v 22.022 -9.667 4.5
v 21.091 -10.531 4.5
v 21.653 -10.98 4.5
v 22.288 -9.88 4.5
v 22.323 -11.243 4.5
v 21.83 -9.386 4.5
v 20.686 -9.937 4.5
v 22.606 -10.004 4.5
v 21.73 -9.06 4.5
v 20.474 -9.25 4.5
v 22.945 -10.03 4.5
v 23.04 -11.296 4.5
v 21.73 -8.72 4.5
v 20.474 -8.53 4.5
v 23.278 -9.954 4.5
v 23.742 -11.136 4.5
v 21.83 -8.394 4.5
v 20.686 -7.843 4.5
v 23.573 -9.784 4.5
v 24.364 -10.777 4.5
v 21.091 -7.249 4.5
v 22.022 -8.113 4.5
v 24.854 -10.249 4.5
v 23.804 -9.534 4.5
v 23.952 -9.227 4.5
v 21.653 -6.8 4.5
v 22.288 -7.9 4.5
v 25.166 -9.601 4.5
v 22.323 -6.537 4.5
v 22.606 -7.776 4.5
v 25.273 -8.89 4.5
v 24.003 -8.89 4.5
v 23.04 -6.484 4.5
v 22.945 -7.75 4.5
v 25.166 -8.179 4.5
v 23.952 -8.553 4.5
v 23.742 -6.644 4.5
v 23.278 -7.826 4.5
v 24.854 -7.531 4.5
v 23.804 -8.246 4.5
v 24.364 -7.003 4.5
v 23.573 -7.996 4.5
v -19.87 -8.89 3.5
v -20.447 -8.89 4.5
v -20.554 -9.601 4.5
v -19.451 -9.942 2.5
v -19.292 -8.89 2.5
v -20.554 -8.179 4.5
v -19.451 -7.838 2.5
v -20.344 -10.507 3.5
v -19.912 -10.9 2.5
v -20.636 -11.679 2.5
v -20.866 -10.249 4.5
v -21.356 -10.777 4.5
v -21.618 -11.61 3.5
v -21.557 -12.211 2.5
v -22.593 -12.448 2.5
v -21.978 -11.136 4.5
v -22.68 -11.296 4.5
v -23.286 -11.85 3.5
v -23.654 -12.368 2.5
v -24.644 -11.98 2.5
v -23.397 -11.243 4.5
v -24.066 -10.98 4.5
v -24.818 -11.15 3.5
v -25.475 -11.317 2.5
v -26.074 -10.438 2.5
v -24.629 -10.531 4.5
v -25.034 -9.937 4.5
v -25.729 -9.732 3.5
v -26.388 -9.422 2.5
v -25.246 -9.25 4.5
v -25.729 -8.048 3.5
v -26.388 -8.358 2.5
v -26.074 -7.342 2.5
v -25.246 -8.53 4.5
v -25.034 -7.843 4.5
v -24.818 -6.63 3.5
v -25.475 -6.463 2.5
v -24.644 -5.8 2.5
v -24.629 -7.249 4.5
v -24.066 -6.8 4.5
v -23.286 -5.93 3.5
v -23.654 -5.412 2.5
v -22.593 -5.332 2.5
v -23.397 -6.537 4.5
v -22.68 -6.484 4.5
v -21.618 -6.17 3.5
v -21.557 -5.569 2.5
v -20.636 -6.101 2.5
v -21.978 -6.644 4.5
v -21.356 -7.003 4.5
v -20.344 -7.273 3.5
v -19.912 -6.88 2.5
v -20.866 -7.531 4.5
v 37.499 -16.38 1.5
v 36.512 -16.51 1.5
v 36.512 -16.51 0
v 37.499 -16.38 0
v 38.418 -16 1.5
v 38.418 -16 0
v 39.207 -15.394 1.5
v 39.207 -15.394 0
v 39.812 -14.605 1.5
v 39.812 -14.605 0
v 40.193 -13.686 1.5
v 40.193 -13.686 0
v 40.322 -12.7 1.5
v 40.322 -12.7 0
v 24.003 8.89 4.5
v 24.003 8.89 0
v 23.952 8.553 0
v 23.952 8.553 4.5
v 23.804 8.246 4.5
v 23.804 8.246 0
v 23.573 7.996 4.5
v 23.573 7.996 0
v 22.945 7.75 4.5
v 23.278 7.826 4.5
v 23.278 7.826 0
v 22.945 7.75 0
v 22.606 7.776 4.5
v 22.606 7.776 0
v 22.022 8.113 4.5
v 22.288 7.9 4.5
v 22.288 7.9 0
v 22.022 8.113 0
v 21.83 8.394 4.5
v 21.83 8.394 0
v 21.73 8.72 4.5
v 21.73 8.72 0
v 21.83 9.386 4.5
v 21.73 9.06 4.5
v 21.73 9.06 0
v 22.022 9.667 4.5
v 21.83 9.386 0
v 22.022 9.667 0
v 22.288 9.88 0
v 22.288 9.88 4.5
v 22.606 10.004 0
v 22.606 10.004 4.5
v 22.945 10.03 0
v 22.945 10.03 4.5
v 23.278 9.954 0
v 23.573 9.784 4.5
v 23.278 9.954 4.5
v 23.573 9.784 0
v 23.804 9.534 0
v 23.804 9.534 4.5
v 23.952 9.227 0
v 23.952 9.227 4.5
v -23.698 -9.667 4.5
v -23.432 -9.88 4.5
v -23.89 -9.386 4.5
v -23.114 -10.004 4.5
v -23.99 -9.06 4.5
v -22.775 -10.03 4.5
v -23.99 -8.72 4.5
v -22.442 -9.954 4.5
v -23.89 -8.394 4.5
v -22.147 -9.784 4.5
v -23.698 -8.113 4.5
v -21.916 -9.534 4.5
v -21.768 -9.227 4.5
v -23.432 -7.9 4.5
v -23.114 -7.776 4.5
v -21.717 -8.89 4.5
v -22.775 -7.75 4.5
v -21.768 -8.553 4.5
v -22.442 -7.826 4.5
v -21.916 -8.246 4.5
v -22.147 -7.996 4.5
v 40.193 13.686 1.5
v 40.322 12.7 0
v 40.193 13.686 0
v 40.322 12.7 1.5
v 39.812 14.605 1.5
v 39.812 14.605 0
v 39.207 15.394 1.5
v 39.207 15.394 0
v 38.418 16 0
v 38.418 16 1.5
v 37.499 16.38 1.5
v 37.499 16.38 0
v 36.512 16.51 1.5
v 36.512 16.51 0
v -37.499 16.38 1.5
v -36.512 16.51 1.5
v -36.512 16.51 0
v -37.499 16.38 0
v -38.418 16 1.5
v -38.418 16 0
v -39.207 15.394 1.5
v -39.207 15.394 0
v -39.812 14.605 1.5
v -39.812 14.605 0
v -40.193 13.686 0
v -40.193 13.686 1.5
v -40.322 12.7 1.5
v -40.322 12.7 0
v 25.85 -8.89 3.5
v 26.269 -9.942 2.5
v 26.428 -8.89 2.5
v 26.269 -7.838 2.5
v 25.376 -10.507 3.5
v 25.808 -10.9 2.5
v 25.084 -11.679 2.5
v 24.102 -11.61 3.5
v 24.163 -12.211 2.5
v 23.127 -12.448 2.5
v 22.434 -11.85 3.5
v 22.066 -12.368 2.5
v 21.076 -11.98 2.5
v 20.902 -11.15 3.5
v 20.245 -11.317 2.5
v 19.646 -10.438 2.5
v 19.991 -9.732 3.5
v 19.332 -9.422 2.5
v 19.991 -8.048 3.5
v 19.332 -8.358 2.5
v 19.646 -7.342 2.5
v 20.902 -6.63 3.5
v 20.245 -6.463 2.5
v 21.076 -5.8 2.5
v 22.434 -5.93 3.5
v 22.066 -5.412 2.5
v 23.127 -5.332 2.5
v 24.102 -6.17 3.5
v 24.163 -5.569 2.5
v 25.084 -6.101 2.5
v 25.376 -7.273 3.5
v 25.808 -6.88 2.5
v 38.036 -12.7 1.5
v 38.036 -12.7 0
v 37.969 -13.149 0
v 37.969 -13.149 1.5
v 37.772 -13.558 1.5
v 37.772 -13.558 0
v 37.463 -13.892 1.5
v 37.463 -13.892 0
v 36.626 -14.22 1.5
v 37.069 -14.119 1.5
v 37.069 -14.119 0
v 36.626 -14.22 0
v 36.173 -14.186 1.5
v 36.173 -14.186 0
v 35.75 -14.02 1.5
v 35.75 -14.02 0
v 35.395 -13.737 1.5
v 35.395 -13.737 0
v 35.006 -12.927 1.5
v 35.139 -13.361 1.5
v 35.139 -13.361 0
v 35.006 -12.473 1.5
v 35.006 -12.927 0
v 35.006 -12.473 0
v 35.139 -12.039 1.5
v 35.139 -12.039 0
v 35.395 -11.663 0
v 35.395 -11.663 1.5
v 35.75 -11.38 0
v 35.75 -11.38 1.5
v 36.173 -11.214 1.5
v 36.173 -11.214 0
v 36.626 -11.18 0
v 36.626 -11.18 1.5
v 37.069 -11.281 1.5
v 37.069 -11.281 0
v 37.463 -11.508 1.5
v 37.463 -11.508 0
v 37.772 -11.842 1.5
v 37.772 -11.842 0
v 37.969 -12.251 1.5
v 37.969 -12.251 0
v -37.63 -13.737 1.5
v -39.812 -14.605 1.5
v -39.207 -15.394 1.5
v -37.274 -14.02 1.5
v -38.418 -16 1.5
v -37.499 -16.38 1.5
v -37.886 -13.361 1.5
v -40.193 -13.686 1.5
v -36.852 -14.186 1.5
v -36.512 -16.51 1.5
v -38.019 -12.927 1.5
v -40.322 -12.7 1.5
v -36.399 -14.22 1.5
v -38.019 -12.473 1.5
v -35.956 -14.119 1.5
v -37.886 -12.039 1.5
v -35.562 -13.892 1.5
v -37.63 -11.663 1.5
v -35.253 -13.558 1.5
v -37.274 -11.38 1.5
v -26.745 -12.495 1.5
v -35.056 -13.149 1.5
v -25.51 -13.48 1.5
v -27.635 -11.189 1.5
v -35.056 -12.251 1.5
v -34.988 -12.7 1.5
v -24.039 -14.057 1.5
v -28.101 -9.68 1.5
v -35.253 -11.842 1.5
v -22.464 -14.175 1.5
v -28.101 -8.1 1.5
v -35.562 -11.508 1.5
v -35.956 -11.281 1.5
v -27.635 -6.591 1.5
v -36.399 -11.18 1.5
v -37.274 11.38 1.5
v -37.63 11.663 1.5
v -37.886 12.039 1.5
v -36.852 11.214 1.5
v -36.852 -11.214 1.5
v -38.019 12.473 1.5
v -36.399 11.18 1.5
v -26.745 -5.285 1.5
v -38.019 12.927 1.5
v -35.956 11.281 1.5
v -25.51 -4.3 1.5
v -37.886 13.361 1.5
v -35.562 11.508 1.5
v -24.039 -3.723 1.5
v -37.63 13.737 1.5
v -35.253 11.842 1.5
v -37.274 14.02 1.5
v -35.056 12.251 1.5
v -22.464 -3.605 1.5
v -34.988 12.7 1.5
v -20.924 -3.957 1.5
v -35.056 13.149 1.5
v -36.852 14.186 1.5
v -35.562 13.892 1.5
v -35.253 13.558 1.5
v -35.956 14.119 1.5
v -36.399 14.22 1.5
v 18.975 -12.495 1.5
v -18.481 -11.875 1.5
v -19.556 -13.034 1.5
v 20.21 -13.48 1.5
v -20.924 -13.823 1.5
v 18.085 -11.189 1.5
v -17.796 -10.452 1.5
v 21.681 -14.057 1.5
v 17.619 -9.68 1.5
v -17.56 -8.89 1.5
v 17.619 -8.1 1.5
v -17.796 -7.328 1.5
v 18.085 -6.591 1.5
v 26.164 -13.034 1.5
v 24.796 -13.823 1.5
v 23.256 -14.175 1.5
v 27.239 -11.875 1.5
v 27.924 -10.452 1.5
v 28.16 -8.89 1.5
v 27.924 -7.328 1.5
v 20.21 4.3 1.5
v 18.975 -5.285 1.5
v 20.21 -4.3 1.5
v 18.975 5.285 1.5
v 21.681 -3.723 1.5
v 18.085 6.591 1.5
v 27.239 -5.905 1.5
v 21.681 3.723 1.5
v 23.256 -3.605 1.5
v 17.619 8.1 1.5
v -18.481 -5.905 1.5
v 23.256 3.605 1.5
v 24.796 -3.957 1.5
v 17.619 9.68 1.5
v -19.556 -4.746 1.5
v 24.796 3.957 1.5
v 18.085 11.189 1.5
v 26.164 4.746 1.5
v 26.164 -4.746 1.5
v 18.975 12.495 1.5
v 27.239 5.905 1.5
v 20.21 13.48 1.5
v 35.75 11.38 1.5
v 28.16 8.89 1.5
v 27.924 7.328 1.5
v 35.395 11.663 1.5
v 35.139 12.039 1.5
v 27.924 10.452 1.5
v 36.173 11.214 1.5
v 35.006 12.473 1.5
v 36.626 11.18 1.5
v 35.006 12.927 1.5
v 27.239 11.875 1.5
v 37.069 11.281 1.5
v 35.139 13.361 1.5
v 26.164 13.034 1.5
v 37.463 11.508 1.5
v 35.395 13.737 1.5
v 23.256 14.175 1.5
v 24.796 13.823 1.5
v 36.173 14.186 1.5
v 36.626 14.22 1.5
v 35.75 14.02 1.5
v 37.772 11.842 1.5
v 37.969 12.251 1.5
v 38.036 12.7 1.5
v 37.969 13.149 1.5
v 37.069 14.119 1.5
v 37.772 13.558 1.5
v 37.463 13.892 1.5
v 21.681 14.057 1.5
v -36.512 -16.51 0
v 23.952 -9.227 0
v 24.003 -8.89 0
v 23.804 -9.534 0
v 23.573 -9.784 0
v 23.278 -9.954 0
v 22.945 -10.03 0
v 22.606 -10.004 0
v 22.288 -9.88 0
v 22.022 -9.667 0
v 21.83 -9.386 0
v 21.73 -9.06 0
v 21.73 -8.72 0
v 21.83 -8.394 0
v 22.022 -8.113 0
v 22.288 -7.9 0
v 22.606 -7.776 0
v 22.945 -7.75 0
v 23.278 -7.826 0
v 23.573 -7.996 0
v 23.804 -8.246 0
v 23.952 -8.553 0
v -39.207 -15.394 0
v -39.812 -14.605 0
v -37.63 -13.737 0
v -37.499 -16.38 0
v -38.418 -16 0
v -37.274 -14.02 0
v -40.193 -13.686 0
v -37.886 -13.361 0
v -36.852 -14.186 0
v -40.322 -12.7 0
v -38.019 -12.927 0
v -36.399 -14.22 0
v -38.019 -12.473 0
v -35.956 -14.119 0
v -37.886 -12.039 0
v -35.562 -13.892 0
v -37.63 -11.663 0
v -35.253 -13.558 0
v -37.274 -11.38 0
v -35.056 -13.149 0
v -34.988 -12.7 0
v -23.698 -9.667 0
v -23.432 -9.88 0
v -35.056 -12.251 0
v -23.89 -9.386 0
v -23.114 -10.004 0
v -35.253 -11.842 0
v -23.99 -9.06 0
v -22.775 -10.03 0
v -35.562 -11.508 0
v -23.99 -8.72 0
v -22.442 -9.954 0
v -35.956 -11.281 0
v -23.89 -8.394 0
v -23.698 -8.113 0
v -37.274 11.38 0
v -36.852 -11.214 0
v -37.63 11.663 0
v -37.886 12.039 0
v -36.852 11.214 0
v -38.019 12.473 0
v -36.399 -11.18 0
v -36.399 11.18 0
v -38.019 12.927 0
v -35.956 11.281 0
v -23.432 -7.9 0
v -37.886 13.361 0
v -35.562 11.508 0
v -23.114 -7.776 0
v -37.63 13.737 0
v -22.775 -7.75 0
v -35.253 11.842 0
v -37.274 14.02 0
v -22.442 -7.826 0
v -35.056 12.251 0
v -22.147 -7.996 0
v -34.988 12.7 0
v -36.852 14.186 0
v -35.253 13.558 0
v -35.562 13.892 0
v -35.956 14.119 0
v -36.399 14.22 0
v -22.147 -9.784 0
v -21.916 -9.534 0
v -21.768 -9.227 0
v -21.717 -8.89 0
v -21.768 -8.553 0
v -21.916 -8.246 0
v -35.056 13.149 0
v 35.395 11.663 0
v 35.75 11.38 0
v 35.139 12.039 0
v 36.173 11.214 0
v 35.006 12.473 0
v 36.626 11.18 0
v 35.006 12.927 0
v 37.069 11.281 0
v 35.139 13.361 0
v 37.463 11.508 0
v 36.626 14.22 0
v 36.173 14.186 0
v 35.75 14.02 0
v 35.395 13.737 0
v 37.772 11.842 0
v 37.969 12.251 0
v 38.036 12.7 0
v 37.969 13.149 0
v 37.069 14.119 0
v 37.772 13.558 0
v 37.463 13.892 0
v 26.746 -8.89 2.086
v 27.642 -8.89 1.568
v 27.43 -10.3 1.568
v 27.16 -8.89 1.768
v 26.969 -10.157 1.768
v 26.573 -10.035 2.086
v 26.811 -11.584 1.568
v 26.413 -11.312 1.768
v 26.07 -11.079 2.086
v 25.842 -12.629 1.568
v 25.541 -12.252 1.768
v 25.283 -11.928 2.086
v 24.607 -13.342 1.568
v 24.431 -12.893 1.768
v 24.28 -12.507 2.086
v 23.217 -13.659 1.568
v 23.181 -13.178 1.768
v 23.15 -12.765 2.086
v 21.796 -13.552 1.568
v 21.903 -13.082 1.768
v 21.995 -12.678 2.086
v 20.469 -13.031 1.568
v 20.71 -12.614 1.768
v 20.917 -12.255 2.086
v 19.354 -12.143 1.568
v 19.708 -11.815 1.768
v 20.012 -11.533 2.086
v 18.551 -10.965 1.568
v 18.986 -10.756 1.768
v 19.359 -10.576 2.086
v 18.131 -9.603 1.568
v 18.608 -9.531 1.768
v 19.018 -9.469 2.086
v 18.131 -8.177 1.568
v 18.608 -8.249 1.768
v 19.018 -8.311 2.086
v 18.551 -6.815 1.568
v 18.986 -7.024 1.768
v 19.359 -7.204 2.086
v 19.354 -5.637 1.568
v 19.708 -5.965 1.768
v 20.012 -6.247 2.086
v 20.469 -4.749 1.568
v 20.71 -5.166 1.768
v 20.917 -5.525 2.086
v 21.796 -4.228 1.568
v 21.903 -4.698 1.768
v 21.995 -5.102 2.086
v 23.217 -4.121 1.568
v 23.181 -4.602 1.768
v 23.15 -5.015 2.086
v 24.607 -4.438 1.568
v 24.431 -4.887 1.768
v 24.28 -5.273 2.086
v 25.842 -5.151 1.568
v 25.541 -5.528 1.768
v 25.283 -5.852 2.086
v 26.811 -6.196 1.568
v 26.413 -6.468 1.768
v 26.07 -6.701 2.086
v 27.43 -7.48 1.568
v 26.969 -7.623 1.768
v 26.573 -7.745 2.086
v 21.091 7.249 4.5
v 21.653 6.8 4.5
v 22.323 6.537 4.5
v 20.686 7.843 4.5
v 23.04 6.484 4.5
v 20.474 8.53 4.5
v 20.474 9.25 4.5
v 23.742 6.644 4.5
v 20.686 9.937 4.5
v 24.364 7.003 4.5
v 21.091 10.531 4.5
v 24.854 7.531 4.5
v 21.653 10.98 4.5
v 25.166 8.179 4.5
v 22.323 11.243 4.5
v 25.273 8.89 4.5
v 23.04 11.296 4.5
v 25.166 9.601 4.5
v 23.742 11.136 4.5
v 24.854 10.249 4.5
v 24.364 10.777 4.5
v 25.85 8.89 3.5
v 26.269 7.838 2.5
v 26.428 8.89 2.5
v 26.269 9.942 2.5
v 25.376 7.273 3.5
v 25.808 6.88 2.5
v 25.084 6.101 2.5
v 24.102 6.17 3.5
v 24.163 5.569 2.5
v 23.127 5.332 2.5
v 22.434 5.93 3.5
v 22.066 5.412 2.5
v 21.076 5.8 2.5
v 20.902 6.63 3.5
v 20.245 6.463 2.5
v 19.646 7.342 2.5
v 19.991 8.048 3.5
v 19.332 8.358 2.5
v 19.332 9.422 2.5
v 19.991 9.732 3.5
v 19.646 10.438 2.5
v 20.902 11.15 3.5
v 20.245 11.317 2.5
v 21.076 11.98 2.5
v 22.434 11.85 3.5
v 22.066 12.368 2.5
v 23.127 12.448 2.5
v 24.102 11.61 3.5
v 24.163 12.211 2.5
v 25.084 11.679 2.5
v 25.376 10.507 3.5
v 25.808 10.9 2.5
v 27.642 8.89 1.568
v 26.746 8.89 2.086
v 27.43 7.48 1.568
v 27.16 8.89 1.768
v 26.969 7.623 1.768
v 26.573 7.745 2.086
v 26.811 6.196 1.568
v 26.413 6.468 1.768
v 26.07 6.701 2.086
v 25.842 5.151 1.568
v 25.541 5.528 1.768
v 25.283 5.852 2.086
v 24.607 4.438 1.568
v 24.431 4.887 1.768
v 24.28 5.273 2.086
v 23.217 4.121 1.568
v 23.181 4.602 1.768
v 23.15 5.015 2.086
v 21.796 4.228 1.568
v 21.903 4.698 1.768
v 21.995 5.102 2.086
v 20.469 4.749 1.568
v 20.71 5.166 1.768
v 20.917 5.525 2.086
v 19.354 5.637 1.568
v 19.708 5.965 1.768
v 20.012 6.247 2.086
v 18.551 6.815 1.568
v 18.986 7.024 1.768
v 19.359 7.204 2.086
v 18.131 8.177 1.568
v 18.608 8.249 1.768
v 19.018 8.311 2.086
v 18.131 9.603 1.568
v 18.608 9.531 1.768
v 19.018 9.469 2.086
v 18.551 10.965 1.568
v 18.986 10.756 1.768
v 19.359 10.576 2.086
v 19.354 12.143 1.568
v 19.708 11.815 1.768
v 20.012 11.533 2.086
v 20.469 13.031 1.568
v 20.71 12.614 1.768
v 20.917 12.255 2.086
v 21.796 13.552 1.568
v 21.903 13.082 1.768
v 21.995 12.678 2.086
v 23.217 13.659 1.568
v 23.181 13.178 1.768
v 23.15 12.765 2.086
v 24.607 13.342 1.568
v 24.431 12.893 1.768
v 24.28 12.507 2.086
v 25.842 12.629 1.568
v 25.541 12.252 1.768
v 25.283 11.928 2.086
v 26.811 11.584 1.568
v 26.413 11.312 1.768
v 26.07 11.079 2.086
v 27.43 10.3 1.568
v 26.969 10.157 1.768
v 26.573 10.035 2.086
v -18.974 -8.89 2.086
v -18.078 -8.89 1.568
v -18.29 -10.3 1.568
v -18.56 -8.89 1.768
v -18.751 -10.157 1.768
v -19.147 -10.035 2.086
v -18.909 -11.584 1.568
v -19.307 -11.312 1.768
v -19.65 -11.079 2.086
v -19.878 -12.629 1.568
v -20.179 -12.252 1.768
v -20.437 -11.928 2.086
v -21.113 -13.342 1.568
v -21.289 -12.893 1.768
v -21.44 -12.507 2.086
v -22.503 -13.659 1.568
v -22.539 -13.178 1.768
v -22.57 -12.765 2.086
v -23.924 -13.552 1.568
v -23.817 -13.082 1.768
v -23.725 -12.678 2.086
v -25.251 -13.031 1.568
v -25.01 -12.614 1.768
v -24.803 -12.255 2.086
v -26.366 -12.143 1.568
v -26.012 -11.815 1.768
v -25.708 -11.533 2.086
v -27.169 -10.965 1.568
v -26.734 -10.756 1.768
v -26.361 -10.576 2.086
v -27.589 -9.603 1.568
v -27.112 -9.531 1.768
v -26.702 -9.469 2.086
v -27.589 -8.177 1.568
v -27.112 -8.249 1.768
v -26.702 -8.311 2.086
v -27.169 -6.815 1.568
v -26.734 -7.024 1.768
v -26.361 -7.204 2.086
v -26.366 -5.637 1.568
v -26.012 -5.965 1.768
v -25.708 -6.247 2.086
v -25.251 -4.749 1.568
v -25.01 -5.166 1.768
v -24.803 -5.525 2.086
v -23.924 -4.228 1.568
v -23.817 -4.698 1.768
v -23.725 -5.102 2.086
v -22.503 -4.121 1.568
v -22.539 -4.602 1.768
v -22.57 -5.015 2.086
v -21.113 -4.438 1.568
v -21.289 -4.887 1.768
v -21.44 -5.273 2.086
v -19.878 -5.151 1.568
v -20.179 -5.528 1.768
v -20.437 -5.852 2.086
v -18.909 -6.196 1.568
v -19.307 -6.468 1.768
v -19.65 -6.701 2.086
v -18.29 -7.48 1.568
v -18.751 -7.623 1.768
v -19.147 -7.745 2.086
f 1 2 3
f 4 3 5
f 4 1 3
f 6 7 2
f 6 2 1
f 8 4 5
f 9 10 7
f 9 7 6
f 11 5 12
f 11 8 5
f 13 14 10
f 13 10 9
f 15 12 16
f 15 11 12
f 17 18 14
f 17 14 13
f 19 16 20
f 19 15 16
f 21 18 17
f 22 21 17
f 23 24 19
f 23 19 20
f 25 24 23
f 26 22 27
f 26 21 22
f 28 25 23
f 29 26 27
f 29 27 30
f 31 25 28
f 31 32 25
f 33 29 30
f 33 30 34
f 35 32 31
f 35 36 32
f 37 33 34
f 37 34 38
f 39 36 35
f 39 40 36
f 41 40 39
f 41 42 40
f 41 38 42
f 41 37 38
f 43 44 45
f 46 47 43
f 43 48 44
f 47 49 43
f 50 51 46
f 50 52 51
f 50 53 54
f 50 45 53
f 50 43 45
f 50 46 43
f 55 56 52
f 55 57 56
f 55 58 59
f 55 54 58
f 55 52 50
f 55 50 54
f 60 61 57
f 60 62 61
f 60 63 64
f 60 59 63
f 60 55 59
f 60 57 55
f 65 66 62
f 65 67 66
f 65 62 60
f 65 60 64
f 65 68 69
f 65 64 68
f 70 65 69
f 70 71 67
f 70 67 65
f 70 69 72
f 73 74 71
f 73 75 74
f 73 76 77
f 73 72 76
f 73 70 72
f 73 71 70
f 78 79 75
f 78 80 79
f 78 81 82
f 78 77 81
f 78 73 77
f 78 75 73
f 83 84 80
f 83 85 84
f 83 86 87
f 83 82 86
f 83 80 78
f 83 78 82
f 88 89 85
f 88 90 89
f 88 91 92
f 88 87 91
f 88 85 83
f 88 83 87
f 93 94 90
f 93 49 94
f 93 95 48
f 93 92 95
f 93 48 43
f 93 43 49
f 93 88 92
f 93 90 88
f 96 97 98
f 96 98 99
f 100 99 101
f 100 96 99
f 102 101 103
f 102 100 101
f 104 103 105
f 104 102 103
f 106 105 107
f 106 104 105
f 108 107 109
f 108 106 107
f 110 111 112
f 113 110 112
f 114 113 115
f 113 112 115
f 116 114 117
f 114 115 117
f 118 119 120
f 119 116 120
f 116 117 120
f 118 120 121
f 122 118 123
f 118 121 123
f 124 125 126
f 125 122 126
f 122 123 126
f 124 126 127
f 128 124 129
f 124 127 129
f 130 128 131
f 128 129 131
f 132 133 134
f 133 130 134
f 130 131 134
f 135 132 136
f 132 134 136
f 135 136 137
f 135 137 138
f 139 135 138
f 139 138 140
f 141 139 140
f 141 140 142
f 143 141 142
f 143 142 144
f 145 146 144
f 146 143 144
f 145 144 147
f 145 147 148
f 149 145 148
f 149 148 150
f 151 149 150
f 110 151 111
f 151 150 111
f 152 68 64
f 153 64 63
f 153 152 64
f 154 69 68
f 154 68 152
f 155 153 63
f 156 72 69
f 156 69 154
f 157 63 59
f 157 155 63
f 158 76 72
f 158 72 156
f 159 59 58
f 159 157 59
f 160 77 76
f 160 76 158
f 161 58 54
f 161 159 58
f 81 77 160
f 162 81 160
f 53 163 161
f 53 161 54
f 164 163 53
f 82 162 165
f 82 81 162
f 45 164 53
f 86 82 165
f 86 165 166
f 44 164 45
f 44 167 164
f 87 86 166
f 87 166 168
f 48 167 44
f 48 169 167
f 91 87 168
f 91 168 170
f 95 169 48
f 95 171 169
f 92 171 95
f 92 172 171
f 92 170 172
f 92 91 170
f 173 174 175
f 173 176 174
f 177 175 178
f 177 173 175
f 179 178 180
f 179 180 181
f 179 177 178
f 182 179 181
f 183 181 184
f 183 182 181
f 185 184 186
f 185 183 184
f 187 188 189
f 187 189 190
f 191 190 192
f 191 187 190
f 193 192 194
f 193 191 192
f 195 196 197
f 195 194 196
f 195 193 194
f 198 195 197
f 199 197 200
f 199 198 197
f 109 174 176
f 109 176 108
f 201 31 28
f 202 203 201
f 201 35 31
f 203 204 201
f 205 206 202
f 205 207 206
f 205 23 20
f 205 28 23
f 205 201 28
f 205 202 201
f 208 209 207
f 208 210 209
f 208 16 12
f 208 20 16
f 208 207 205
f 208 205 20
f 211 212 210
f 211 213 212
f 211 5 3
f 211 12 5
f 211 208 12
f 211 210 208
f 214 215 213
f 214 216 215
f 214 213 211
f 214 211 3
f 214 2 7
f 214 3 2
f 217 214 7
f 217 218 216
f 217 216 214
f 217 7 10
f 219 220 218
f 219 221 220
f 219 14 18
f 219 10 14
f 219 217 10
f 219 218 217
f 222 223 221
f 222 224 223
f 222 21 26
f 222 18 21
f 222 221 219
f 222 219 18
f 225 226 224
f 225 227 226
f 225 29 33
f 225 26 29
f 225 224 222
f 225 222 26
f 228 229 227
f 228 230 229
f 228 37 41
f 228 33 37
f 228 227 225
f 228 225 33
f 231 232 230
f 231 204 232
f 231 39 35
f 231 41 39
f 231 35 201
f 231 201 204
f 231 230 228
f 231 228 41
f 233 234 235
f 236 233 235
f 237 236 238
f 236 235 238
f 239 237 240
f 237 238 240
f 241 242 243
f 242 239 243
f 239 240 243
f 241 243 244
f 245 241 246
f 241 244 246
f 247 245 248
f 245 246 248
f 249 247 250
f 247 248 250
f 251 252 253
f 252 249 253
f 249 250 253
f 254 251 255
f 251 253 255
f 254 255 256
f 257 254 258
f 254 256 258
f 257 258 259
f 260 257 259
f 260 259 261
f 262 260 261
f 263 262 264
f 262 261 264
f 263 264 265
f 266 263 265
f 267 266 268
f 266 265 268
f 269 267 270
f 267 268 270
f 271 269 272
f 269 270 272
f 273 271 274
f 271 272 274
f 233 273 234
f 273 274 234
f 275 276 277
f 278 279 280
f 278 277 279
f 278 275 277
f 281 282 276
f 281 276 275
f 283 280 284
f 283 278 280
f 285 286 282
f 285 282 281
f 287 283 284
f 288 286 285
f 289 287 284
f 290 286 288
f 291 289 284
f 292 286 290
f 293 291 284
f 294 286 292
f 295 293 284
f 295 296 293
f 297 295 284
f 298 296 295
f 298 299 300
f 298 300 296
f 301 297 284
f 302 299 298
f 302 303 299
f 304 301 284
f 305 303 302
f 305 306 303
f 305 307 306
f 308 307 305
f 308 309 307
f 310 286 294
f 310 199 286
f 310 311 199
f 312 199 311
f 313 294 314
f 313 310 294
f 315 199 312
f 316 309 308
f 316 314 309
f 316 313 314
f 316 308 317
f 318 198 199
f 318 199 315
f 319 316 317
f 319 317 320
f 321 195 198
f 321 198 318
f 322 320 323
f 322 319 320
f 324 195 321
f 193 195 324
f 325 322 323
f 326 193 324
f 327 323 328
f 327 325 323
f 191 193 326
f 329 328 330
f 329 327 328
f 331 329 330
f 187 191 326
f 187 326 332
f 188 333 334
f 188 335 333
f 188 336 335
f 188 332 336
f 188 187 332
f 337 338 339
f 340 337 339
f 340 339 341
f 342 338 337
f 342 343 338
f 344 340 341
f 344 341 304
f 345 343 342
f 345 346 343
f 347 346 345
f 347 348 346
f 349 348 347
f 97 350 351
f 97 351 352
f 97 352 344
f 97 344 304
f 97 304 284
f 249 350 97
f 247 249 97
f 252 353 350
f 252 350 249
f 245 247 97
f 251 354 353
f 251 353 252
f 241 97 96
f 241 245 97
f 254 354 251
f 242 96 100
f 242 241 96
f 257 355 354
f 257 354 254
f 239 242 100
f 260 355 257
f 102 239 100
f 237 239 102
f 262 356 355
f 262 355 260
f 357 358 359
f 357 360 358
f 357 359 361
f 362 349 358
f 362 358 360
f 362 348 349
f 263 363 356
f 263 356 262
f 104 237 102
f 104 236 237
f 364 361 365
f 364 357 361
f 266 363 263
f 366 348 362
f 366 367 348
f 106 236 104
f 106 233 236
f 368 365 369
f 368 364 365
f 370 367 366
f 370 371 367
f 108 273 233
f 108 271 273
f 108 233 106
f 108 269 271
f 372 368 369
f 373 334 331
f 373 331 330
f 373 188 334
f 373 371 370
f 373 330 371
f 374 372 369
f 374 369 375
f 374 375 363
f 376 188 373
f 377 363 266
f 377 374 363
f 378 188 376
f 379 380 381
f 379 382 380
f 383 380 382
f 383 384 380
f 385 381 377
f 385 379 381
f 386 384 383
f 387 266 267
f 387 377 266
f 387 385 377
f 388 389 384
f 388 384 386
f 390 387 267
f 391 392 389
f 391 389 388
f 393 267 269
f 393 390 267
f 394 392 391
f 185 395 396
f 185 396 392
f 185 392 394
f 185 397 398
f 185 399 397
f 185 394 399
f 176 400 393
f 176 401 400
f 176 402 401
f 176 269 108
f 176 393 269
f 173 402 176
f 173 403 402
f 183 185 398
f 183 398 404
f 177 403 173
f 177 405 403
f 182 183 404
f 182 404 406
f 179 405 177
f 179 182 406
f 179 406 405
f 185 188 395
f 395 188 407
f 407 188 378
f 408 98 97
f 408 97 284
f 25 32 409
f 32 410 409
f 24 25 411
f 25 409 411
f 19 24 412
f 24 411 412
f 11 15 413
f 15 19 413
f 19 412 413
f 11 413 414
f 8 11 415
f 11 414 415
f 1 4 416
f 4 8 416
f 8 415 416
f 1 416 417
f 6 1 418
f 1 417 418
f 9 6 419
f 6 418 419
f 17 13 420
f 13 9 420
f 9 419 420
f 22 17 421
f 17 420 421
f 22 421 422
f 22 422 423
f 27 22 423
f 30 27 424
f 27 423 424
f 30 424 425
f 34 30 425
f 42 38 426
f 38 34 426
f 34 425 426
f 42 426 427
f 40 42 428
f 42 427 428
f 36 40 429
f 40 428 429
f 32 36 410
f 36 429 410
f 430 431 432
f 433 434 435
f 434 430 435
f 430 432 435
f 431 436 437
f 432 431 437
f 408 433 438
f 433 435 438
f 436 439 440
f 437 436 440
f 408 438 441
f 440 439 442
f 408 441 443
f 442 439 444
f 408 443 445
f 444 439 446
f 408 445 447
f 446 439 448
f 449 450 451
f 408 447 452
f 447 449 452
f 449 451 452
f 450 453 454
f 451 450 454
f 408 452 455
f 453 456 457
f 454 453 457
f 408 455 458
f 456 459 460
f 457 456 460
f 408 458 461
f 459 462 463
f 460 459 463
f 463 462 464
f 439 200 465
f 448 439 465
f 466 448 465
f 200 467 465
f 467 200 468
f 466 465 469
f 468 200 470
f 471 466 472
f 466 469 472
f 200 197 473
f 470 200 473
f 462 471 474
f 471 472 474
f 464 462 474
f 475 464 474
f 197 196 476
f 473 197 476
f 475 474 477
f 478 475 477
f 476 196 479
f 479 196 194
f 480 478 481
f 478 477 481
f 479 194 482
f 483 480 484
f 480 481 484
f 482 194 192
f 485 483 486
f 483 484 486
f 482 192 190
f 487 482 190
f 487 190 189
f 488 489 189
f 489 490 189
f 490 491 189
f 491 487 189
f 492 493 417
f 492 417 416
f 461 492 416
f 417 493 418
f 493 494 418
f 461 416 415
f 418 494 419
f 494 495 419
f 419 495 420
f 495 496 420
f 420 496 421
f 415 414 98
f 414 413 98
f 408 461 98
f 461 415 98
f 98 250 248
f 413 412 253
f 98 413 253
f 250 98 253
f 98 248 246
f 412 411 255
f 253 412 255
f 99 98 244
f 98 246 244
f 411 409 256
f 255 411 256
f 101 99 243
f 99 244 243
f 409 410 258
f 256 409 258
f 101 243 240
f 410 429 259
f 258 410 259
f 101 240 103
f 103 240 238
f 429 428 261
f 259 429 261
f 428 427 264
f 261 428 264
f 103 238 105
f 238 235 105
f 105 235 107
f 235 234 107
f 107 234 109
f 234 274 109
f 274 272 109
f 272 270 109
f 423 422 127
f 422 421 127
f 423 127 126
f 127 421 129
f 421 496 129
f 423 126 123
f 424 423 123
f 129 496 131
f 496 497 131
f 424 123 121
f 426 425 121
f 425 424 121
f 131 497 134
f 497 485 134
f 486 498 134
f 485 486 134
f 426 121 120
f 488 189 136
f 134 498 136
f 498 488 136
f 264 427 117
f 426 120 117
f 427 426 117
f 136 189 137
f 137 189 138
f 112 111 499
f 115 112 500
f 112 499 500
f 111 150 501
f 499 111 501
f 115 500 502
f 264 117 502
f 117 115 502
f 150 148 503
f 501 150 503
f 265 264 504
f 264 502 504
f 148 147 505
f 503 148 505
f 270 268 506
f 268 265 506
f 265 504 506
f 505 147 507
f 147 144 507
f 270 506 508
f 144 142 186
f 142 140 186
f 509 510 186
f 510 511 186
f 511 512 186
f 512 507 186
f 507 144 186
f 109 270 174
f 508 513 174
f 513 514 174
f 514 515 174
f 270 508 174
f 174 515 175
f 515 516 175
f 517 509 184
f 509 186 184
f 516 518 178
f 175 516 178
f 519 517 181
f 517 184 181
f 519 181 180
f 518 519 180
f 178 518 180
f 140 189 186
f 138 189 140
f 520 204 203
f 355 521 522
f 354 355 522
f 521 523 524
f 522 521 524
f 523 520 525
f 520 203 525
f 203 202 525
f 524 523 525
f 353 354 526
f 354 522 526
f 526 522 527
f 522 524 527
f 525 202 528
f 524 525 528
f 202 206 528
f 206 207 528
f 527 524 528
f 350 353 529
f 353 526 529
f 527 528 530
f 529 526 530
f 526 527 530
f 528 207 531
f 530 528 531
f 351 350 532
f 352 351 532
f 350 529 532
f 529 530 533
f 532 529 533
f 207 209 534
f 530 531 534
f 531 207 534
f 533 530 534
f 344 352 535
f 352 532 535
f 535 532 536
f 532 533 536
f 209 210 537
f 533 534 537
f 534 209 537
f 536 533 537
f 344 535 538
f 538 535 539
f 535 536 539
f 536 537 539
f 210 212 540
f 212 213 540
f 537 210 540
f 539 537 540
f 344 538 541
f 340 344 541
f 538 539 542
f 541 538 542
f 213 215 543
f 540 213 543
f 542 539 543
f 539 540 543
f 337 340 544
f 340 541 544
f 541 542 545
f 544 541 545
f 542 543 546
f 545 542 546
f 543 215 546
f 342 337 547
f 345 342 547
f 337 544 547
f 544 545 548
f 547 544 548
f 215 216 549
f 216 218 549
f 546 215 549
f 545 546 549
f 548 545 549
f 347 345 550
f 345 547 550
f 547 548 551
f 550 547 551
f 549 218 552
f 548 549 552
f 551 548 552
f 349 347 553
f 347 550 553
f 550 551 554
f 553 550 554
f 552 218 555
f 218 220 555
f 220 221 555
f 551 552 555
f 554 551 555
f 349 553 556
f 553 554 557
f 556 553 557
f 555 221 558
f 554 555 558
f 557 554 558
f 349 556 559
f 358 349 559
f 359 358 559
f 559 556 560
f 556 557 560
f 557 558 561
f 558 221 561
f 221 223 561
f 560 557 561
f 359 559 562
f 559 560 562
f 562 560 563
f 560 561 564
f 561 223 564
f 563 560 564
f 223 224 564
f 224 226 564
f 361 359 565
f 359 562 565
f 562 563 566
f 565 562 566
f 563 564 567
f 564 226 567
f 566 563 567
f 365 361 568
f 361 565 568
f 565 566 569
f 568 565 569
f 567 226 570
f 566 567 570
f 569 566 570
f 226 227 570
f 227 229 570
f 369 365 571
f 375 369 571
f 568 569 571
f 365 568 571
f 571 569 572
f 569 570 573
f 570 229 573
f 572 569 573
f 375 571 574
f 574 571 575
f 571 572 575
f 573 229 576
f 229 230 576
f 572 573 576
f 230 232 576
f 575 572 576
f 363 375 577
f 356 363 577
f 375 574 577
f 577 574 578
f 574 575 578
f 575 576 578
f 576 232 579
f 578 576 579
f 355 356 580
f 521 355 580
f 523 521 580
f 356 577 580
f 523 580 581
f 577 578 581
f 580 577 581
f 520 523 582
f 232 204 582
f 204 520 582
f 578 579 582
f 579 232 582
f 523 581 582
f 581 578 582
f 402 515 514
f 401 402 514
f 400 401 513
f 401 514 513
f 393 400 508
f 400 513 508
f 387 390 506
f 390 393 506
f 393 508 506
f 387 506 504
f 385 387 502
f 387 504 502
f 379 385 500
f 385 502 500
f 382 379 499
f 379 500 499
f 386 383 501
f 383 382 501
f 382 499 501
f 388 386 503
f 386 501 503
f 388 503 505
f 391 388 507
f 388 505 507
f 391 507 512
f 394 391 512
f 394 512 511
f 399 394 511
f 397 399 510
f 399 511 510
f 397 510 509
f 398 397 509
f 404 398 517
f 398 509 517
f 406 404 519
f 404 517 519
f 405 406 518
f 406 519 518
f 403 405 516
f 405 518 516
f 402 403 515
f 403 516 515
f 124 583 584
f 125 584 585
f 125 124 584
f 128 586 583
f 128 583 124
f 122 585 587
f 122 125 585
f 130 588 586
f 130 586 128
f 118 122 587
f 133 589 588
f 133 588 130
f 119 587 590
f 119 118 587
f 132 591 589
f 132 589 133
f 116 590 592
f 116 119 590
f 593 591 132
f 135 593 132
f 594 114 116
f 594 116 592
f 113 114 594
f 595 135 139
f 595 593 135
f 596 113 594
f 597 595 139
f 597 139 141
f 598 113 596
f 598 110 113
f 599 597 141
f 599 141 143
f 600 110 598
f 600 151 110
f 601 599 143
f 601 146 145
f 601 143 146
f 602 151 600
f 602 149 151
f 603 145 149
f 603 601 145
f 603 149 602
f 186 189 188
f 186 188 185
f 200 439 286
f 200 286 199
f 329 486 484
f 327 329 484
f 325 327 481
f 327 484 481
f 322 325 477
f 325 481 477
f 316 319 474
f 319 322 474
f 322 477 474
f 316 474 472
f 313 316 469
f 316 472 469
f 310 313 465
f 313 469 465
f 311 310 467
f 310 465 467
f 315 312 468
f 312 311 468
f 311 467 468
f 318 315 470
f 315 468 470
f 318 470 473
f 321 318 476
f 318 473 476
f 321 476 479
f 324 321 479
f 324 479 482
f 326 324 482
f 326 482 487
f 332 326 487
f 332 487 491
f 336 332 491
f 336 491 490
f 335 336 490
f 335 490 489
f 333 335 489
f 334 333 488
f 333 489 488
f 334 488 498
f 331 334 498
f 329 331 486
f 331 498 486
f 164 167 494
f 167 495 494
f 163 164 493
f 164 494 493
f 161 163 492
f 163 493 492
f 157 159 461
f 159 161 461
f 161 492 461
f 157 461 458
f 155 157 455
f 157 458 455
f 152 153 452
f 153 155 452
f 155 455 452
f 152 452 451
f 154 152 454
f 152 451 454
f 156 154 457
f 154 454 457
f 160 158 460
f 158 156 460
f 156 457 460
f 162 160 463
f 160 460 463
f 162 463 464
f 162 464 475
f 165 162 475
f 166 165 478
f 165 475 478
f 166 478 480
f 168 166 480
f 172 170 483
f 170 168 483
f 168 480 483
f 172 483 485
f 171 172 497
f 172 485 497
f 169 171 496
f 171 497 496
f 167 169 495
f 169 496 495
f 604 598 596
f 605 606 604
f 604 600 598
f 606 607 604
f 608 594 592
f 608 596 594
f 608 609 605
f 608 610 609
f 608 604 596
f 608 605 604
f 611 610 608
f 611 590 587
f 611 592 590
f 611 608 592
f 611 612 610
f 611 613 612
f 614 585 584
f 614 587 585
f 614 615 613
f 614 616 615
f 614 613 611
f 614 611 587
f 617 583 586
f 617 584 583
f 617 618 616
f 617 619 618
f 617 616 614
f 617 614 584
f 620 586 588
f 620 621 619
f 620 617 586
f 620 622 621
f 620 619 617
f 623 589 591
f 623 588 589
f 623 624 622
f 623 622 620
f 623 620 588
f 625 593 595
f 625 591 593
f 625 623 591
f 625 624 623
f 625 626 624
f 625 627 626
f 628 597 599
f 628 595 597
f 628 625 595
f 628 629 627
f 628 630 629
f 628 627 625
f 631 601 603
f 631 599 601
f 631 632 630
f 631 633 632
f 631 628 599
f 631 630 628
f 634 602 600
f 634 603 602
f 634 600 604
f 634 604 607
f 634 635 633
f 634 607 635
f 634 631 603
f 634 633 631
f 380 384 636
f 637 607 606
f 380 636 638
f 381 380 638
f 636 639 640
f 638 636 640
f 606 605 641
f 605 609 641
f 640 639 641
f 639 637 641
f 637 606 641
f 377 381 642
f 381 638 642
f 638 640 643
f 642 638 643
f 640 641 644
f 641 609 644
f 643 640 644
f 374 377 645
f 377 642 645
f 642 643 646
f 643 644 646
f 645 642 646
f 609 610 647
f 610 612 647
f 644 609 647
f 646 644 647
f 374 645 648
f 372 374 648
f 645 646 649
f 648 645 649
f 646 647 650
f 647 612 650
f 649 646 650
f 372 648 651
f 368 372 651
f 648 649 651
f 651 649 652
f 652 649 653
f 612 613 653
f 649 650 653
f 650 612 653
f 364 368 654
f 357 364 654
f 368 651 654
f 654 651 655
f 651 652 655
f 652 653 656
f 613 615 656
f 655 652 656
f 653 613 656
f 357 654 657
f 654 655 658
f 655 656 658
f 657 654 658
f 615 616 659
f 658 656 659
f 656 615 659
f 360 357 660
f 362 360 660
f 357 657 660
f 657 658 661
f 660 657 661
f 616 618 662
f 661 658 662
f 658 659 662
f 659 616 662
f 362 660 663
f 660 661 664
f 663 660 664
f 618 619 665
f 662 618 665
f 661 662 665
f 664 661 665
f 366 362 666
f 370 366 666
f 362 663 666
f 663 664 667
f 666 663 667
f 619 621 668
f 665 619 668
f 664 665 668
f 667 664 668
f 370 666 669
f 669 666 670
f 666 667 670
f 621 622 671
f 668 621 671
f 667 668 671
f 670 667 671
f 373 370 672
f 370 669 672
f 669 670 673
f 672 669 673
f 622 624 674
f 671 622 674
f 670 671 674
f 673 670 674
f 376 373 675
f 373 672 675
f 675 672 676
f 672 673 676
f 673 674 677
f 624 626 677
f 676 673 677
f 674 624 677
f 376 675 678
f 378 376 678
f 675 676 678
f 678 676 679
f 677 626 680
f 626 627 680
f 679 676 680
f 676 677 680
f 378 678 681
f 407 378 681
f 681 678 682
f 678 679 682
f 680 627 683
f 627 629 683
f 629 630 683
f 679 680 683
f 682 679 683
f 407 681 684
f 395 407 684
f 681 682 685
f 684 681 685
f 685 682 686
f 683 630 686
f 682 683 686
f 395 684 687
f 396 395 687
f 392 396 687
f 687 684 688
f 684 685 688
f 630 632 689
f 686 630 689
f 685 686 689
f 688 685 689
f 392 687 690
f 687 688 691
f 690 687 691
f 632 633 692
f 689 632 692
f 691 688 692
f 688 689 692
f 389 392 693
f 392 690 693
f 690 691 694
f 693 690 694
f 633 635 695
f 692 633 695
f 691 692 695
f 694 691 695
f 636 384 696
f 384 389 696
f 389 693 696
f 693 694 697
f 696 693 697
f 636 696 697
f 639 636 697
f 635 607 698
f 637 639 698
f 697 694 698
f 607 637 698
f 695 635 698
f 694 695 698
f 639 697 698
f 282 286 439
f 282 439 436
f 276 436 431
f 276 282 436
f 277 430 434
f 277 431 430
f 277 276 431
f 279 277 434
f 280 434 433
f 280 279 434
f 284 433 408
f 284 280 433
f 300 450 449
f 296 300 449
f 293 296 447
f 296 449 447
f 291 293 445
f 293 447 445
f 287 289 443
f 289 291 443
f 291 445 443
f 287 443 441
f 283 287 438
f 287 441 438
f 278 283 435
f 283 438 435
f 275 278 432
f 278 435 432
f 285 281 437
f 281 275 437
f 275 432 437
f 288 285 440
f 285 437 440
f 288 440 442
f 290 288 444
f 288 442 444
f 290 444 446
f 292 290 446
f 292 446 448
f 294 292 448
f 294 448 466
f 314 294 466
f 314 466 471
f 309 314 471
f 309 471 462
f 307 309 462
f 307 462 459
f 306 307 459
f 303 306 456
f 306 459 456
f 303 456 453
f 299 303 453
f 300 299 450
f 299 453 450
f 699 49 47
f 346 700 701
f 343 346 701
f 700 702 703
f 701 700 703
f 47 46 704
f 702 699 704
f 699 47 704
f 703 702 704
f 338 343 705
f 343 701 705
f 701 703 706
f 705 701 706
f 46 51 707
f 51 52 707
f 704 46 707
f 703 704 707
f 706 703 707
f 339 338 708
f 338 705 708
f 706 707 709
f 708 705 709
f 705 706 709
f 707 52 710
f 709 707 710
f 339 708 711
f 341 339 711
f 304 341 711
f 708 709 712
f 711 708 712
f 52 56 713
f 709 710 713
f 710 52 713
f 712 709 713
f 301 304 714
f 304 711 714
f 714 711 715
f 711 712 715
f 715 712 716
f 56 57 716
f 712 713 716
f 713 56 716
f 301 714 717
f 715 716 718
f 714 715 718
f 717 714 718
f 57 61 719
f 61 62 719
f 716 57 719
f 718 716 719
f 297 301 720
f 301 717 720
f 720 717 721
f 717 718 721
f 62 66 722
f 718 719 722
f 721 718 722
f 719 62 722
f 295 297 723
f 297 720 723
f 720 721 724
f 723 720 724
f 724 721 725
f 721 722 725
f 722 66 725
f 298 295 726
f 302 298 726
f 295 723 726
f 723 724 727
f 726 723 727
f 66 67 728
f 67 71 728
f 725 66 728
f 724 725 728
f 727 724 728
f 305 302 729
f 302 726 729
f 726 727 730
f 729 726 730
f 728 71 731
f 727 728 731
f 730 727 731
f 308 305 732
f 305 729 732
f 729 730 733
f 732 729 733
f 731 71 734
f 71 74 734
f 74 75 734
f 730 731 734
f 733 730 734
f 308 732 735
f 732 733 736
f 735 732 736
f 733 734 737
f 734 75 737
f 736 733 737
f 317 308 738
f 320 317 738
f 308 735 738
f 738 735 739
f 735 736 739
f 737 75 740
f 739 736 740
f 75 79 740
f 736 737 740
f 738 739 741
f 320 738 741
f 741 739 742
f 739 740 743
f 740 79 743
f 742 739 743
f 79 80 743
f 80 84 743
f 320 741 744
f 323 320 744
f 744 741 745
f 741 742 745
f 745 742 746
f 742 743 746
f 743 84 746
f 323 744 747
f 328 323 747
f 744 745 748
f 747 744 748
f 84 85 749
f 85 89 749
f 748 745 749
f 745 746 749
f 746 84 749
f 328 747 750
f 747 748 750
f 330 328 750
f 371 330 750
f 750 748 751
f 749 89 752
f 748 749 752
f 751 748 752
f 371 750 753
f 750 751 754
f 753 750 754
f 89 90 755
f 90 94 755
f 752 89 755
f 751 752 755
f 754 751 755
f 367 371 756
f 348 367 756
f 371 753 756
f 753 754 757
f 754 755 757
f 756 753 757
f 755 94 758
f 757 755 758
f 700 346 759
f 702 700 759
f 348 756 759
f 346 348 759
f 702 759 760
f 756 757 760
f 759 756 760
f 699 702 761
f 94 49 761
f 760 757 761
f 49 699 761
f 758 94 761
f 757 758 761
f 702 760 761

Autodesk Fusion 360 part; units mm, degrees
sketch "Sketch1" plane through (0, 0, 0) normal (0, 0, 1) x (1, 0, 0)
  line L0 (36.5125, -12.7) -> (-36.5125, -12.7) construction
  line L1 (-36.5125, -12.7) -> (-36.5125, 12.7) construction
  line L2 (-36.5125, 12.7) -> (36.5125, 12.7) construction
  line L3 (36.5125, 12.7) -> (36.5125, -12.7) construction
  line L4 (36.5125, -12.7) -> (-36.5125, 12.7) construction
  line L5 (-36.5125, -12.7) -> (36.5125, 12.7) construction
  line L6 (40.3225, -16.51) -> (-40.3225, -16.51)
  line L7 (-40.3225, -16.51) -> (-40.3225, 16.51)
  line L8 (-40.3225, 16.51) -> (40.3225, 16.51)
  line L9 (40.3225, 16.51) -> (40.3225, -16.51)
  circle A0 centre (-36.5125, 12.7) radius 1.524
  circle A1 centre (36.5125, 12.7) radius 1.524
  circle A2 centre (-36.5125, -12.7) radius 1.524
  circle A3 centre (36.5125, -12.7) radius 1.524
  line L10 (22.86, -8.89) -> (-22.86, -8.89) construction
  line L11 (-22.86, -8.89) -> (-22.86, 8.89) construction
  line L12 (-22.86, 8.89) -> (22.86, 8.89) construction
  line L13 (22.86, 8.89) -> (22.86, -8.89) construction
  line L14 (22.86, -8.89) -> (-22.86, 8.89) construction
  line L15 (-22.86, -8.89) -> (22.86, 8.89) construction
  circle A4 centre (-22.86, 8.89) radius 1.143
  circle A5 centre (22.86, 8.89) radius 1.143
  circle A6 centre (-22.86, -8.89) radius 1.143
  circle A7 centre (22.86, -8.89) radius 1.143
  circle A8 centre (-22.86, 8.89) radius 2.413
  circle A9 centre (22.86, 8.89) radius 2.413
  circle A10 centre (-22.86, -8.89) radius 2.413
  circle A11 centre (22.86, -8.89) radius 2.413
  dimension "d1" = 73.025
  dimension "d2" = 25.4
  dimension "d3" = -3.81
  dimension "d4" = 3.048
  dimension "d7" = 73.025
  dimension "d8" = -25.4
  dimension "d9" = 45.72
  dimension "d10" = 17.78
  dimension "d11" = 2.286
  dimension "d14" = 45.72
  dimension "d15" = -17.78
  dimension "d16" = 1.27
  dimension "d17" = 1.27
  dimension "d18" = 1.27
  dimension "d19" = 1.27
extrude "Extrude1" add sketch "Sketch1" along normal blind 1.5 contours L6 L7 L8 L9 | A4 | A8 | A9 | A10 | A11
extrude "Extrude2" add sketch "Sketch1" along normal blind 4.5 contours A9 | A10 | A11
draft "Draft1" angle 30 neutral plane through (0, 0, 4.5) pull (0, 0, 1) 3 faces at (-20.459, -8.6497, 2.5) (25.261, 9.1303, 2.5) (25.261, -8.6497, 2.5)
fillet "Fillet1" radius 3.81 4 edges at (-40.3225, -16.51, 0.75) (-40.3225, 16.51, 0.75) (40.3225, 16.51, 0.75) (40.3225, -16.51, 0.75)
fillet "Fillet2" radius 2 3 edges at (-26.7245, -7.3911, 1.5) (18.9955, -7.3911, 1.5) (18.9955, 10.3889, 1.5)
